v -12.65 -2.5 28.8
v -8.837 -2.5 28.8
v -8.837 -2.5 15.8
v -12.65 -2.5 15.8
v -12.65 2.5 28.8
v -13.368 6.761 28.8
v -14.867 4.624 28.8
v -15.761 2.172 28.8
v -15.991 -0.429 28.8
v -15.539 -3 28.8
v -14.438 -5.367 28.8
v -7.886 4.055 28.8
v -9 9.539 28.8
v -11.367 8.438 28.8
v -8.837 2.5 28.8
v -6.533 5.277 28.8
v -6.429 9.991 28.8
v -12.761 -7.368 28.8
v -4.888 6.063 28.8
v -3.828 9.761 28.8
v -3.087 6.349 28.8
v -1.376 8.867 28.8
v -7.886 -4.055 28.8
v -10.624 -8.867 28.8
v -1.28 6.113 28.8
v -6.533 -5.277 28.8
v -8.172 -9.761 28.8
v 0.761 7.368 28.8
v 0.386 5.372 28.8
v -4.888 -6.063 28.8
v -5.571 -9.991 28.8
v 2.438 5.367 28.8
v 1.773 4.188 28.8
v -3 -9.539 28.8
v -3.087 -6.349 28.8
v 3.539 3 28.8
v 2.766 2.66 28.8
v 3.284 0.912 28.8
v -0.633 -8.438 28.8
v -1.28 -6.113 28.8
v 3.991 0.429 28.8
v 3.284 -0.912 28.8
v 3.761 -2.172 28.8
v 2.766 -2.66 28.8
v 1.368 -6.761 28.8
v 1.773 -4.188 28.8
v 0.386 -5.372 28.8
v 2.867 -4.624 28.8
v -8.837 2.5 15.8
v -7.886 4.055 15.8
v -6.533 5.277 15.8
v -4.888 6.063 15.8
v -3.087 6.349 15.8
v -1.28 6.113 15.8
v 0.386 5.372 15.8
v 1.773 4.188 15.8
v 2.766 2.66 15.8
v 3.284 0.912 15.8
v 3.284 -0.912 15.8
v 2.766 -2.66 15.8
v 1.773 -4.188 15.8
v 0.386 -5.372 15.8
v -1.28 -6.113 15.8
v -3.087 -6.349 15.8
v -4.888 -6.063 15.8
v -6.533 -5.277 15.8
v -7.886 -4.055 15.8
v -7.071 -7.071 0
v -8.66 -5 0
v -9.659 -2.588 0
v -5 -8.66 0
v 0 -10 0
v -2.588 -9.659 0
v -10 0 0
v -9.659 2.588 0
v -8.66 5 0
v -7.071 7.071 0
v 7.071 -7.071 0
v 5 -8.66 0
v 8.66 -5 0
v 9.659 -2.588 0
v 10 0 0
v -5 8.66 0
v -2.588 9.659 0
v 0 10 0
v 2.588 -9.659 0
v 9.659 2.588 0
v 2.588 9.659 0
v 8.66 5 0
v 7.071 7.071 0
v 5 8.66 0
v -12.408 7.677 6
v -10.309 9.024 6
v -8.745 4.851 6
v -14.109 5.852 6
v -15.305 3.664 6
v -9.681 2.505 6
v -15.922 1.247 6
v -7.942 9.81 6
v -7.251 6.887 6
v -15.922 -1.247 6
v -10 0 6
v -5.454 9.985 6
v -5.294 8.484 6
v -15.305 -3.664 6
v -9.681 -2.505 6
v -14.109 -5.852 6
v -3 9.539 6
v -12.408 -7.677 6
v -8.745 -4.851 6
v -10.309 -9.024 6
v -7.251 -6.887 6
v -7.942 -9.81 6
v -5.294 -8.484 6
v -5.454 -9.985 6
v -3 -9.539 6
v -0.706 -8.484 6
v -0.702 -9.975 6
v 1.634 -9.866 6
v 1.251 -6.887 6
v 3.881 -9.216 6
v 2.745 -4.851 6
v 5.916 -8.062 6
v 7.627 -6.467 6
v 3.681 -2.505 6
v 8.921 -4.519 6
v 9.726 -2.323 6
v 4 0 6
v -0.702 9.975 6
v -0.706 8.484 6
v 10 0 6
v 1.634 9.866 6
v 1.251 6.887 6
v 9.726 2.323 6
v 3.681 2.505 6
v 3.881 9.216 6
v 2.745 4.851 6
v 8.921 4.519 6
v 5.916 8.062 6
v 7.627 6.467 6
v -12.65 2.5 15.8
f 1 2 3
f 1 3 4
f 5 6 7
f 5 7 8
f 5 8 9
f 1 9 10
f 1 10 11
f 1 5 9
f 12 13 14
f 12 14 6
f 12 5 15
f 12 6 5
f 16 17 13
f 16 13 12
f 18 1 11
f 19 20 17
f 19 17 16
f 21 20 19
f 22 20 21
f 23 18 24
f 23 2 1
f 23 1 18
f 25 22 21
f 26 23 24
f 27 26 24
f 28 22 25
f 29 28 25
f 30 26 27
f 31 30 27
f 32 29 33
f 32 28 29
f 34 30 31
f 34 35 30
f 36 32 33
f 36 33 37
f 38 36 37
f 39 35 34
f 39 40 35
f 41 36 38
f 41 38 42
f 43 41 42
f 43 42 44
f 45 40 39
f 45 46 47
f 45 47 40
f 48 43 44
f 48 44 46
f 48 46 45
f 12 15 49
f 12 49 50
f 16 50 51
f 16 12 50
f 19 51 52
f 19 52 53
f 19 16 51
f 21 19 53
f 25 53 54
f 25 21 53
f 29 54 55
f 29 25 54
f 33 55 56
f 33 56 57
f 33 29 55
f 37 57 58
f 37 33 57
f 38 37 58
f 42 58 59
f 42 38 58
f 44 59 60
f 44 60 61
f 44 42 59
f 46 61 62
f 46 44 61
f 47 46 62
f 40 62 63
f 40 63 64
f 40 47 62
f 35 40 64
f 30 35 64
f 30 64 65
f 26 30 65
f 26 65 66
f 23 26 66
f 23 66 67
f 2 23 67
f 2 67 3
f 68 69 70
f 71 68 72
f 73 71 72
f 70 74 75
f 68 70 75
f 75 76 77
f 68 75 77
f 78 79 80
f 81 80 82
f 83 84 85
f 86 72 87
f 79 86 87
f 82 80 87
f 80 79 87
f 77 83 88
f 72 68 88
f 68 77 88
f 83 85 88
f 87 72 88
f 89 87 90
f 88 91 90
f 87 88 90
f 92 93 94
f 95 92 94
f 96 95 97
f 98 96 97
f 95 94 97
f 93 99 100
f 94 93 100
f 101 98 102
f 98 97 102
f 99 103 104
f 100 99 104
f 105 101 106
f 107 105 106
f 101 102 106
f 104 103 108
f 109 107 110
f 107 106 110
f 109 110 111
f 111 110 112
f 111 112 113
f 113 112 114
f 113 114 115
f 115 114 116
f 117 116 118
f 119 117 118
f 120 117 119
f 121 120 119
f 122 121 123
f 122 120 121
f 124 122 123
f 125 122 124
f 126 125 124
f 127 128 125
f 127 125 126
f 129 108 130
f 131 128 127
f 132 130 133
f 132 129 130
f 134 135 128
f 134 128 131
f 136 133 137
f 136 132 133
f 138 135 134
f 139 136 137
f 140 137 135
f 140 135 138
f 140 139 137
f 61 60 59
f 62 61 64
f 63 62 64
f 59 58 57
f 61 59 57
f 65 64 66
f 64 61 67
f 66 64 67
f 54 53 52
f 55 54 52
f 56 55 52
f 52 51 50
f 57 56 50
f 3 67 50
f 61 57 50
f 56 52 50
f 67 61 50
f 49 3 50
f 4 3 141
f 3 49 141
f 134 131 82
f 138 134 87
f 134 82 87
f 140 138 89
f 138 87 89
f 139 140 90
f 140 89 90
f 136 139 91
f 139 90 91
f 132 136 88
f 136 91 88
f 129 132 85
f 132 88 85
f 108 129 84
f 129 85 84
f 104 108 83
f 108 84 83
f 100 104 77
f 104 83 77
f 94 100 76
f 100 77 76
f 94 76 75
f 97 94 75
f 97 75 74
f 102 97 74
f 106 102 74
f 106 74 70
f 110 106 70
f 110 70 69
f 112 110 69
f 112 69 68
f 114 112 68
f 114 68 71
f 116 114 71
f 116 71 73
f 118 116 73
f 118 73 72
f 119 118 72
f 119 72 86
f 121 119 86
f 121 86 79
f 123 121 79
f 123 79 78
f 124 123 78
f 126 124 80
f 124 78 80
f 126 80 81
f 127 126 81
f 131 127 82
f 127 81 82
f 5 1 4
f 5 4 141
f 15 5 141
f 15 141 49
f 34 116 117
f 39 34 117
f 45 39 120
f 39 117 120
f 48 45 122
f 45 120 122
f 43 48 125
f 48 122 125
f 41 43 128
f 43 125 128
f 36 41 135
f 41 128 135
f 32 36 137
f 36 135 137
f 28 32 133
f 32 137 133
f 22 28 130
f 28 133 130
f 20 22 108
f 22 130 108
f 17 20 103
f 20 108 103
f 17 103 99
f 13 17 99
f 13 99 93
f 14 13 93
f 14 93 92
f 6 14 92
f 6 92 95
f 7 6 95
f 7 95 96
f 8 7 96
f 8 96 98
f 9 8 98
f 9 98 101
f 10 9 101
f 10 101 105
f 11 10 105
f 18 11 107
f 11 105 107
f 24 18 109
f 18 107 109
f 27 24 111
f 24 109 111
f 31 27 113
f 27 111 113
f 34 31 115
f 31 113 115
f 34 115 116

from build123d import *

# Parameters (mm, degrees)
SKETCH_1_R          = 10
EXTRUDE_1_DEPTH     = 6
SKETCH_2_R          = 10
EXTRUDE_2_DEPTH     = 22.8
CUT_EXTRUDE_1_DEPTH = 13


with BuildPart() as part:
    # 草图1 → 凸台-拉伸1 (new body)
    with BuildSketch(Plane.XY):
        Circle(SKETCH_1_R)
    extrude(amount=EXTRUDE_1_DEPTH)

    # 草图2 → 凸台-拉伸2 (add)
    with BuildSketch(Plane.XY.offset(6)):
        with Locations(Location((-6, 0, 0), (0, 0, 287.457603124))):
            Circle(SKETCH_2_R)
    extrude(amount=EXTRUDE_2_DEPTH)

    # 草图3 → 切除-拉伸1 (cut)
    with BuildSketch(Plane.XY.offset(28.8)):
        with BuildLine():
            Line((-12.65, 2.5), (-8.837165408, 2.5))
            ThreePointArc((-8.837165408, 2.5), (3.35, 0), (-8.837165408, -2.5))
            Line((-8.837165408, -2.5), (-12.65, -2.5))
            Line((-12.65, -2.5), (-12.65, 2.5))
        make_face()
    extrude(amount=-CUT_EXTRUDE_1_DEPTH, mode=Mode.SUBTRACT)


solid = part.part
